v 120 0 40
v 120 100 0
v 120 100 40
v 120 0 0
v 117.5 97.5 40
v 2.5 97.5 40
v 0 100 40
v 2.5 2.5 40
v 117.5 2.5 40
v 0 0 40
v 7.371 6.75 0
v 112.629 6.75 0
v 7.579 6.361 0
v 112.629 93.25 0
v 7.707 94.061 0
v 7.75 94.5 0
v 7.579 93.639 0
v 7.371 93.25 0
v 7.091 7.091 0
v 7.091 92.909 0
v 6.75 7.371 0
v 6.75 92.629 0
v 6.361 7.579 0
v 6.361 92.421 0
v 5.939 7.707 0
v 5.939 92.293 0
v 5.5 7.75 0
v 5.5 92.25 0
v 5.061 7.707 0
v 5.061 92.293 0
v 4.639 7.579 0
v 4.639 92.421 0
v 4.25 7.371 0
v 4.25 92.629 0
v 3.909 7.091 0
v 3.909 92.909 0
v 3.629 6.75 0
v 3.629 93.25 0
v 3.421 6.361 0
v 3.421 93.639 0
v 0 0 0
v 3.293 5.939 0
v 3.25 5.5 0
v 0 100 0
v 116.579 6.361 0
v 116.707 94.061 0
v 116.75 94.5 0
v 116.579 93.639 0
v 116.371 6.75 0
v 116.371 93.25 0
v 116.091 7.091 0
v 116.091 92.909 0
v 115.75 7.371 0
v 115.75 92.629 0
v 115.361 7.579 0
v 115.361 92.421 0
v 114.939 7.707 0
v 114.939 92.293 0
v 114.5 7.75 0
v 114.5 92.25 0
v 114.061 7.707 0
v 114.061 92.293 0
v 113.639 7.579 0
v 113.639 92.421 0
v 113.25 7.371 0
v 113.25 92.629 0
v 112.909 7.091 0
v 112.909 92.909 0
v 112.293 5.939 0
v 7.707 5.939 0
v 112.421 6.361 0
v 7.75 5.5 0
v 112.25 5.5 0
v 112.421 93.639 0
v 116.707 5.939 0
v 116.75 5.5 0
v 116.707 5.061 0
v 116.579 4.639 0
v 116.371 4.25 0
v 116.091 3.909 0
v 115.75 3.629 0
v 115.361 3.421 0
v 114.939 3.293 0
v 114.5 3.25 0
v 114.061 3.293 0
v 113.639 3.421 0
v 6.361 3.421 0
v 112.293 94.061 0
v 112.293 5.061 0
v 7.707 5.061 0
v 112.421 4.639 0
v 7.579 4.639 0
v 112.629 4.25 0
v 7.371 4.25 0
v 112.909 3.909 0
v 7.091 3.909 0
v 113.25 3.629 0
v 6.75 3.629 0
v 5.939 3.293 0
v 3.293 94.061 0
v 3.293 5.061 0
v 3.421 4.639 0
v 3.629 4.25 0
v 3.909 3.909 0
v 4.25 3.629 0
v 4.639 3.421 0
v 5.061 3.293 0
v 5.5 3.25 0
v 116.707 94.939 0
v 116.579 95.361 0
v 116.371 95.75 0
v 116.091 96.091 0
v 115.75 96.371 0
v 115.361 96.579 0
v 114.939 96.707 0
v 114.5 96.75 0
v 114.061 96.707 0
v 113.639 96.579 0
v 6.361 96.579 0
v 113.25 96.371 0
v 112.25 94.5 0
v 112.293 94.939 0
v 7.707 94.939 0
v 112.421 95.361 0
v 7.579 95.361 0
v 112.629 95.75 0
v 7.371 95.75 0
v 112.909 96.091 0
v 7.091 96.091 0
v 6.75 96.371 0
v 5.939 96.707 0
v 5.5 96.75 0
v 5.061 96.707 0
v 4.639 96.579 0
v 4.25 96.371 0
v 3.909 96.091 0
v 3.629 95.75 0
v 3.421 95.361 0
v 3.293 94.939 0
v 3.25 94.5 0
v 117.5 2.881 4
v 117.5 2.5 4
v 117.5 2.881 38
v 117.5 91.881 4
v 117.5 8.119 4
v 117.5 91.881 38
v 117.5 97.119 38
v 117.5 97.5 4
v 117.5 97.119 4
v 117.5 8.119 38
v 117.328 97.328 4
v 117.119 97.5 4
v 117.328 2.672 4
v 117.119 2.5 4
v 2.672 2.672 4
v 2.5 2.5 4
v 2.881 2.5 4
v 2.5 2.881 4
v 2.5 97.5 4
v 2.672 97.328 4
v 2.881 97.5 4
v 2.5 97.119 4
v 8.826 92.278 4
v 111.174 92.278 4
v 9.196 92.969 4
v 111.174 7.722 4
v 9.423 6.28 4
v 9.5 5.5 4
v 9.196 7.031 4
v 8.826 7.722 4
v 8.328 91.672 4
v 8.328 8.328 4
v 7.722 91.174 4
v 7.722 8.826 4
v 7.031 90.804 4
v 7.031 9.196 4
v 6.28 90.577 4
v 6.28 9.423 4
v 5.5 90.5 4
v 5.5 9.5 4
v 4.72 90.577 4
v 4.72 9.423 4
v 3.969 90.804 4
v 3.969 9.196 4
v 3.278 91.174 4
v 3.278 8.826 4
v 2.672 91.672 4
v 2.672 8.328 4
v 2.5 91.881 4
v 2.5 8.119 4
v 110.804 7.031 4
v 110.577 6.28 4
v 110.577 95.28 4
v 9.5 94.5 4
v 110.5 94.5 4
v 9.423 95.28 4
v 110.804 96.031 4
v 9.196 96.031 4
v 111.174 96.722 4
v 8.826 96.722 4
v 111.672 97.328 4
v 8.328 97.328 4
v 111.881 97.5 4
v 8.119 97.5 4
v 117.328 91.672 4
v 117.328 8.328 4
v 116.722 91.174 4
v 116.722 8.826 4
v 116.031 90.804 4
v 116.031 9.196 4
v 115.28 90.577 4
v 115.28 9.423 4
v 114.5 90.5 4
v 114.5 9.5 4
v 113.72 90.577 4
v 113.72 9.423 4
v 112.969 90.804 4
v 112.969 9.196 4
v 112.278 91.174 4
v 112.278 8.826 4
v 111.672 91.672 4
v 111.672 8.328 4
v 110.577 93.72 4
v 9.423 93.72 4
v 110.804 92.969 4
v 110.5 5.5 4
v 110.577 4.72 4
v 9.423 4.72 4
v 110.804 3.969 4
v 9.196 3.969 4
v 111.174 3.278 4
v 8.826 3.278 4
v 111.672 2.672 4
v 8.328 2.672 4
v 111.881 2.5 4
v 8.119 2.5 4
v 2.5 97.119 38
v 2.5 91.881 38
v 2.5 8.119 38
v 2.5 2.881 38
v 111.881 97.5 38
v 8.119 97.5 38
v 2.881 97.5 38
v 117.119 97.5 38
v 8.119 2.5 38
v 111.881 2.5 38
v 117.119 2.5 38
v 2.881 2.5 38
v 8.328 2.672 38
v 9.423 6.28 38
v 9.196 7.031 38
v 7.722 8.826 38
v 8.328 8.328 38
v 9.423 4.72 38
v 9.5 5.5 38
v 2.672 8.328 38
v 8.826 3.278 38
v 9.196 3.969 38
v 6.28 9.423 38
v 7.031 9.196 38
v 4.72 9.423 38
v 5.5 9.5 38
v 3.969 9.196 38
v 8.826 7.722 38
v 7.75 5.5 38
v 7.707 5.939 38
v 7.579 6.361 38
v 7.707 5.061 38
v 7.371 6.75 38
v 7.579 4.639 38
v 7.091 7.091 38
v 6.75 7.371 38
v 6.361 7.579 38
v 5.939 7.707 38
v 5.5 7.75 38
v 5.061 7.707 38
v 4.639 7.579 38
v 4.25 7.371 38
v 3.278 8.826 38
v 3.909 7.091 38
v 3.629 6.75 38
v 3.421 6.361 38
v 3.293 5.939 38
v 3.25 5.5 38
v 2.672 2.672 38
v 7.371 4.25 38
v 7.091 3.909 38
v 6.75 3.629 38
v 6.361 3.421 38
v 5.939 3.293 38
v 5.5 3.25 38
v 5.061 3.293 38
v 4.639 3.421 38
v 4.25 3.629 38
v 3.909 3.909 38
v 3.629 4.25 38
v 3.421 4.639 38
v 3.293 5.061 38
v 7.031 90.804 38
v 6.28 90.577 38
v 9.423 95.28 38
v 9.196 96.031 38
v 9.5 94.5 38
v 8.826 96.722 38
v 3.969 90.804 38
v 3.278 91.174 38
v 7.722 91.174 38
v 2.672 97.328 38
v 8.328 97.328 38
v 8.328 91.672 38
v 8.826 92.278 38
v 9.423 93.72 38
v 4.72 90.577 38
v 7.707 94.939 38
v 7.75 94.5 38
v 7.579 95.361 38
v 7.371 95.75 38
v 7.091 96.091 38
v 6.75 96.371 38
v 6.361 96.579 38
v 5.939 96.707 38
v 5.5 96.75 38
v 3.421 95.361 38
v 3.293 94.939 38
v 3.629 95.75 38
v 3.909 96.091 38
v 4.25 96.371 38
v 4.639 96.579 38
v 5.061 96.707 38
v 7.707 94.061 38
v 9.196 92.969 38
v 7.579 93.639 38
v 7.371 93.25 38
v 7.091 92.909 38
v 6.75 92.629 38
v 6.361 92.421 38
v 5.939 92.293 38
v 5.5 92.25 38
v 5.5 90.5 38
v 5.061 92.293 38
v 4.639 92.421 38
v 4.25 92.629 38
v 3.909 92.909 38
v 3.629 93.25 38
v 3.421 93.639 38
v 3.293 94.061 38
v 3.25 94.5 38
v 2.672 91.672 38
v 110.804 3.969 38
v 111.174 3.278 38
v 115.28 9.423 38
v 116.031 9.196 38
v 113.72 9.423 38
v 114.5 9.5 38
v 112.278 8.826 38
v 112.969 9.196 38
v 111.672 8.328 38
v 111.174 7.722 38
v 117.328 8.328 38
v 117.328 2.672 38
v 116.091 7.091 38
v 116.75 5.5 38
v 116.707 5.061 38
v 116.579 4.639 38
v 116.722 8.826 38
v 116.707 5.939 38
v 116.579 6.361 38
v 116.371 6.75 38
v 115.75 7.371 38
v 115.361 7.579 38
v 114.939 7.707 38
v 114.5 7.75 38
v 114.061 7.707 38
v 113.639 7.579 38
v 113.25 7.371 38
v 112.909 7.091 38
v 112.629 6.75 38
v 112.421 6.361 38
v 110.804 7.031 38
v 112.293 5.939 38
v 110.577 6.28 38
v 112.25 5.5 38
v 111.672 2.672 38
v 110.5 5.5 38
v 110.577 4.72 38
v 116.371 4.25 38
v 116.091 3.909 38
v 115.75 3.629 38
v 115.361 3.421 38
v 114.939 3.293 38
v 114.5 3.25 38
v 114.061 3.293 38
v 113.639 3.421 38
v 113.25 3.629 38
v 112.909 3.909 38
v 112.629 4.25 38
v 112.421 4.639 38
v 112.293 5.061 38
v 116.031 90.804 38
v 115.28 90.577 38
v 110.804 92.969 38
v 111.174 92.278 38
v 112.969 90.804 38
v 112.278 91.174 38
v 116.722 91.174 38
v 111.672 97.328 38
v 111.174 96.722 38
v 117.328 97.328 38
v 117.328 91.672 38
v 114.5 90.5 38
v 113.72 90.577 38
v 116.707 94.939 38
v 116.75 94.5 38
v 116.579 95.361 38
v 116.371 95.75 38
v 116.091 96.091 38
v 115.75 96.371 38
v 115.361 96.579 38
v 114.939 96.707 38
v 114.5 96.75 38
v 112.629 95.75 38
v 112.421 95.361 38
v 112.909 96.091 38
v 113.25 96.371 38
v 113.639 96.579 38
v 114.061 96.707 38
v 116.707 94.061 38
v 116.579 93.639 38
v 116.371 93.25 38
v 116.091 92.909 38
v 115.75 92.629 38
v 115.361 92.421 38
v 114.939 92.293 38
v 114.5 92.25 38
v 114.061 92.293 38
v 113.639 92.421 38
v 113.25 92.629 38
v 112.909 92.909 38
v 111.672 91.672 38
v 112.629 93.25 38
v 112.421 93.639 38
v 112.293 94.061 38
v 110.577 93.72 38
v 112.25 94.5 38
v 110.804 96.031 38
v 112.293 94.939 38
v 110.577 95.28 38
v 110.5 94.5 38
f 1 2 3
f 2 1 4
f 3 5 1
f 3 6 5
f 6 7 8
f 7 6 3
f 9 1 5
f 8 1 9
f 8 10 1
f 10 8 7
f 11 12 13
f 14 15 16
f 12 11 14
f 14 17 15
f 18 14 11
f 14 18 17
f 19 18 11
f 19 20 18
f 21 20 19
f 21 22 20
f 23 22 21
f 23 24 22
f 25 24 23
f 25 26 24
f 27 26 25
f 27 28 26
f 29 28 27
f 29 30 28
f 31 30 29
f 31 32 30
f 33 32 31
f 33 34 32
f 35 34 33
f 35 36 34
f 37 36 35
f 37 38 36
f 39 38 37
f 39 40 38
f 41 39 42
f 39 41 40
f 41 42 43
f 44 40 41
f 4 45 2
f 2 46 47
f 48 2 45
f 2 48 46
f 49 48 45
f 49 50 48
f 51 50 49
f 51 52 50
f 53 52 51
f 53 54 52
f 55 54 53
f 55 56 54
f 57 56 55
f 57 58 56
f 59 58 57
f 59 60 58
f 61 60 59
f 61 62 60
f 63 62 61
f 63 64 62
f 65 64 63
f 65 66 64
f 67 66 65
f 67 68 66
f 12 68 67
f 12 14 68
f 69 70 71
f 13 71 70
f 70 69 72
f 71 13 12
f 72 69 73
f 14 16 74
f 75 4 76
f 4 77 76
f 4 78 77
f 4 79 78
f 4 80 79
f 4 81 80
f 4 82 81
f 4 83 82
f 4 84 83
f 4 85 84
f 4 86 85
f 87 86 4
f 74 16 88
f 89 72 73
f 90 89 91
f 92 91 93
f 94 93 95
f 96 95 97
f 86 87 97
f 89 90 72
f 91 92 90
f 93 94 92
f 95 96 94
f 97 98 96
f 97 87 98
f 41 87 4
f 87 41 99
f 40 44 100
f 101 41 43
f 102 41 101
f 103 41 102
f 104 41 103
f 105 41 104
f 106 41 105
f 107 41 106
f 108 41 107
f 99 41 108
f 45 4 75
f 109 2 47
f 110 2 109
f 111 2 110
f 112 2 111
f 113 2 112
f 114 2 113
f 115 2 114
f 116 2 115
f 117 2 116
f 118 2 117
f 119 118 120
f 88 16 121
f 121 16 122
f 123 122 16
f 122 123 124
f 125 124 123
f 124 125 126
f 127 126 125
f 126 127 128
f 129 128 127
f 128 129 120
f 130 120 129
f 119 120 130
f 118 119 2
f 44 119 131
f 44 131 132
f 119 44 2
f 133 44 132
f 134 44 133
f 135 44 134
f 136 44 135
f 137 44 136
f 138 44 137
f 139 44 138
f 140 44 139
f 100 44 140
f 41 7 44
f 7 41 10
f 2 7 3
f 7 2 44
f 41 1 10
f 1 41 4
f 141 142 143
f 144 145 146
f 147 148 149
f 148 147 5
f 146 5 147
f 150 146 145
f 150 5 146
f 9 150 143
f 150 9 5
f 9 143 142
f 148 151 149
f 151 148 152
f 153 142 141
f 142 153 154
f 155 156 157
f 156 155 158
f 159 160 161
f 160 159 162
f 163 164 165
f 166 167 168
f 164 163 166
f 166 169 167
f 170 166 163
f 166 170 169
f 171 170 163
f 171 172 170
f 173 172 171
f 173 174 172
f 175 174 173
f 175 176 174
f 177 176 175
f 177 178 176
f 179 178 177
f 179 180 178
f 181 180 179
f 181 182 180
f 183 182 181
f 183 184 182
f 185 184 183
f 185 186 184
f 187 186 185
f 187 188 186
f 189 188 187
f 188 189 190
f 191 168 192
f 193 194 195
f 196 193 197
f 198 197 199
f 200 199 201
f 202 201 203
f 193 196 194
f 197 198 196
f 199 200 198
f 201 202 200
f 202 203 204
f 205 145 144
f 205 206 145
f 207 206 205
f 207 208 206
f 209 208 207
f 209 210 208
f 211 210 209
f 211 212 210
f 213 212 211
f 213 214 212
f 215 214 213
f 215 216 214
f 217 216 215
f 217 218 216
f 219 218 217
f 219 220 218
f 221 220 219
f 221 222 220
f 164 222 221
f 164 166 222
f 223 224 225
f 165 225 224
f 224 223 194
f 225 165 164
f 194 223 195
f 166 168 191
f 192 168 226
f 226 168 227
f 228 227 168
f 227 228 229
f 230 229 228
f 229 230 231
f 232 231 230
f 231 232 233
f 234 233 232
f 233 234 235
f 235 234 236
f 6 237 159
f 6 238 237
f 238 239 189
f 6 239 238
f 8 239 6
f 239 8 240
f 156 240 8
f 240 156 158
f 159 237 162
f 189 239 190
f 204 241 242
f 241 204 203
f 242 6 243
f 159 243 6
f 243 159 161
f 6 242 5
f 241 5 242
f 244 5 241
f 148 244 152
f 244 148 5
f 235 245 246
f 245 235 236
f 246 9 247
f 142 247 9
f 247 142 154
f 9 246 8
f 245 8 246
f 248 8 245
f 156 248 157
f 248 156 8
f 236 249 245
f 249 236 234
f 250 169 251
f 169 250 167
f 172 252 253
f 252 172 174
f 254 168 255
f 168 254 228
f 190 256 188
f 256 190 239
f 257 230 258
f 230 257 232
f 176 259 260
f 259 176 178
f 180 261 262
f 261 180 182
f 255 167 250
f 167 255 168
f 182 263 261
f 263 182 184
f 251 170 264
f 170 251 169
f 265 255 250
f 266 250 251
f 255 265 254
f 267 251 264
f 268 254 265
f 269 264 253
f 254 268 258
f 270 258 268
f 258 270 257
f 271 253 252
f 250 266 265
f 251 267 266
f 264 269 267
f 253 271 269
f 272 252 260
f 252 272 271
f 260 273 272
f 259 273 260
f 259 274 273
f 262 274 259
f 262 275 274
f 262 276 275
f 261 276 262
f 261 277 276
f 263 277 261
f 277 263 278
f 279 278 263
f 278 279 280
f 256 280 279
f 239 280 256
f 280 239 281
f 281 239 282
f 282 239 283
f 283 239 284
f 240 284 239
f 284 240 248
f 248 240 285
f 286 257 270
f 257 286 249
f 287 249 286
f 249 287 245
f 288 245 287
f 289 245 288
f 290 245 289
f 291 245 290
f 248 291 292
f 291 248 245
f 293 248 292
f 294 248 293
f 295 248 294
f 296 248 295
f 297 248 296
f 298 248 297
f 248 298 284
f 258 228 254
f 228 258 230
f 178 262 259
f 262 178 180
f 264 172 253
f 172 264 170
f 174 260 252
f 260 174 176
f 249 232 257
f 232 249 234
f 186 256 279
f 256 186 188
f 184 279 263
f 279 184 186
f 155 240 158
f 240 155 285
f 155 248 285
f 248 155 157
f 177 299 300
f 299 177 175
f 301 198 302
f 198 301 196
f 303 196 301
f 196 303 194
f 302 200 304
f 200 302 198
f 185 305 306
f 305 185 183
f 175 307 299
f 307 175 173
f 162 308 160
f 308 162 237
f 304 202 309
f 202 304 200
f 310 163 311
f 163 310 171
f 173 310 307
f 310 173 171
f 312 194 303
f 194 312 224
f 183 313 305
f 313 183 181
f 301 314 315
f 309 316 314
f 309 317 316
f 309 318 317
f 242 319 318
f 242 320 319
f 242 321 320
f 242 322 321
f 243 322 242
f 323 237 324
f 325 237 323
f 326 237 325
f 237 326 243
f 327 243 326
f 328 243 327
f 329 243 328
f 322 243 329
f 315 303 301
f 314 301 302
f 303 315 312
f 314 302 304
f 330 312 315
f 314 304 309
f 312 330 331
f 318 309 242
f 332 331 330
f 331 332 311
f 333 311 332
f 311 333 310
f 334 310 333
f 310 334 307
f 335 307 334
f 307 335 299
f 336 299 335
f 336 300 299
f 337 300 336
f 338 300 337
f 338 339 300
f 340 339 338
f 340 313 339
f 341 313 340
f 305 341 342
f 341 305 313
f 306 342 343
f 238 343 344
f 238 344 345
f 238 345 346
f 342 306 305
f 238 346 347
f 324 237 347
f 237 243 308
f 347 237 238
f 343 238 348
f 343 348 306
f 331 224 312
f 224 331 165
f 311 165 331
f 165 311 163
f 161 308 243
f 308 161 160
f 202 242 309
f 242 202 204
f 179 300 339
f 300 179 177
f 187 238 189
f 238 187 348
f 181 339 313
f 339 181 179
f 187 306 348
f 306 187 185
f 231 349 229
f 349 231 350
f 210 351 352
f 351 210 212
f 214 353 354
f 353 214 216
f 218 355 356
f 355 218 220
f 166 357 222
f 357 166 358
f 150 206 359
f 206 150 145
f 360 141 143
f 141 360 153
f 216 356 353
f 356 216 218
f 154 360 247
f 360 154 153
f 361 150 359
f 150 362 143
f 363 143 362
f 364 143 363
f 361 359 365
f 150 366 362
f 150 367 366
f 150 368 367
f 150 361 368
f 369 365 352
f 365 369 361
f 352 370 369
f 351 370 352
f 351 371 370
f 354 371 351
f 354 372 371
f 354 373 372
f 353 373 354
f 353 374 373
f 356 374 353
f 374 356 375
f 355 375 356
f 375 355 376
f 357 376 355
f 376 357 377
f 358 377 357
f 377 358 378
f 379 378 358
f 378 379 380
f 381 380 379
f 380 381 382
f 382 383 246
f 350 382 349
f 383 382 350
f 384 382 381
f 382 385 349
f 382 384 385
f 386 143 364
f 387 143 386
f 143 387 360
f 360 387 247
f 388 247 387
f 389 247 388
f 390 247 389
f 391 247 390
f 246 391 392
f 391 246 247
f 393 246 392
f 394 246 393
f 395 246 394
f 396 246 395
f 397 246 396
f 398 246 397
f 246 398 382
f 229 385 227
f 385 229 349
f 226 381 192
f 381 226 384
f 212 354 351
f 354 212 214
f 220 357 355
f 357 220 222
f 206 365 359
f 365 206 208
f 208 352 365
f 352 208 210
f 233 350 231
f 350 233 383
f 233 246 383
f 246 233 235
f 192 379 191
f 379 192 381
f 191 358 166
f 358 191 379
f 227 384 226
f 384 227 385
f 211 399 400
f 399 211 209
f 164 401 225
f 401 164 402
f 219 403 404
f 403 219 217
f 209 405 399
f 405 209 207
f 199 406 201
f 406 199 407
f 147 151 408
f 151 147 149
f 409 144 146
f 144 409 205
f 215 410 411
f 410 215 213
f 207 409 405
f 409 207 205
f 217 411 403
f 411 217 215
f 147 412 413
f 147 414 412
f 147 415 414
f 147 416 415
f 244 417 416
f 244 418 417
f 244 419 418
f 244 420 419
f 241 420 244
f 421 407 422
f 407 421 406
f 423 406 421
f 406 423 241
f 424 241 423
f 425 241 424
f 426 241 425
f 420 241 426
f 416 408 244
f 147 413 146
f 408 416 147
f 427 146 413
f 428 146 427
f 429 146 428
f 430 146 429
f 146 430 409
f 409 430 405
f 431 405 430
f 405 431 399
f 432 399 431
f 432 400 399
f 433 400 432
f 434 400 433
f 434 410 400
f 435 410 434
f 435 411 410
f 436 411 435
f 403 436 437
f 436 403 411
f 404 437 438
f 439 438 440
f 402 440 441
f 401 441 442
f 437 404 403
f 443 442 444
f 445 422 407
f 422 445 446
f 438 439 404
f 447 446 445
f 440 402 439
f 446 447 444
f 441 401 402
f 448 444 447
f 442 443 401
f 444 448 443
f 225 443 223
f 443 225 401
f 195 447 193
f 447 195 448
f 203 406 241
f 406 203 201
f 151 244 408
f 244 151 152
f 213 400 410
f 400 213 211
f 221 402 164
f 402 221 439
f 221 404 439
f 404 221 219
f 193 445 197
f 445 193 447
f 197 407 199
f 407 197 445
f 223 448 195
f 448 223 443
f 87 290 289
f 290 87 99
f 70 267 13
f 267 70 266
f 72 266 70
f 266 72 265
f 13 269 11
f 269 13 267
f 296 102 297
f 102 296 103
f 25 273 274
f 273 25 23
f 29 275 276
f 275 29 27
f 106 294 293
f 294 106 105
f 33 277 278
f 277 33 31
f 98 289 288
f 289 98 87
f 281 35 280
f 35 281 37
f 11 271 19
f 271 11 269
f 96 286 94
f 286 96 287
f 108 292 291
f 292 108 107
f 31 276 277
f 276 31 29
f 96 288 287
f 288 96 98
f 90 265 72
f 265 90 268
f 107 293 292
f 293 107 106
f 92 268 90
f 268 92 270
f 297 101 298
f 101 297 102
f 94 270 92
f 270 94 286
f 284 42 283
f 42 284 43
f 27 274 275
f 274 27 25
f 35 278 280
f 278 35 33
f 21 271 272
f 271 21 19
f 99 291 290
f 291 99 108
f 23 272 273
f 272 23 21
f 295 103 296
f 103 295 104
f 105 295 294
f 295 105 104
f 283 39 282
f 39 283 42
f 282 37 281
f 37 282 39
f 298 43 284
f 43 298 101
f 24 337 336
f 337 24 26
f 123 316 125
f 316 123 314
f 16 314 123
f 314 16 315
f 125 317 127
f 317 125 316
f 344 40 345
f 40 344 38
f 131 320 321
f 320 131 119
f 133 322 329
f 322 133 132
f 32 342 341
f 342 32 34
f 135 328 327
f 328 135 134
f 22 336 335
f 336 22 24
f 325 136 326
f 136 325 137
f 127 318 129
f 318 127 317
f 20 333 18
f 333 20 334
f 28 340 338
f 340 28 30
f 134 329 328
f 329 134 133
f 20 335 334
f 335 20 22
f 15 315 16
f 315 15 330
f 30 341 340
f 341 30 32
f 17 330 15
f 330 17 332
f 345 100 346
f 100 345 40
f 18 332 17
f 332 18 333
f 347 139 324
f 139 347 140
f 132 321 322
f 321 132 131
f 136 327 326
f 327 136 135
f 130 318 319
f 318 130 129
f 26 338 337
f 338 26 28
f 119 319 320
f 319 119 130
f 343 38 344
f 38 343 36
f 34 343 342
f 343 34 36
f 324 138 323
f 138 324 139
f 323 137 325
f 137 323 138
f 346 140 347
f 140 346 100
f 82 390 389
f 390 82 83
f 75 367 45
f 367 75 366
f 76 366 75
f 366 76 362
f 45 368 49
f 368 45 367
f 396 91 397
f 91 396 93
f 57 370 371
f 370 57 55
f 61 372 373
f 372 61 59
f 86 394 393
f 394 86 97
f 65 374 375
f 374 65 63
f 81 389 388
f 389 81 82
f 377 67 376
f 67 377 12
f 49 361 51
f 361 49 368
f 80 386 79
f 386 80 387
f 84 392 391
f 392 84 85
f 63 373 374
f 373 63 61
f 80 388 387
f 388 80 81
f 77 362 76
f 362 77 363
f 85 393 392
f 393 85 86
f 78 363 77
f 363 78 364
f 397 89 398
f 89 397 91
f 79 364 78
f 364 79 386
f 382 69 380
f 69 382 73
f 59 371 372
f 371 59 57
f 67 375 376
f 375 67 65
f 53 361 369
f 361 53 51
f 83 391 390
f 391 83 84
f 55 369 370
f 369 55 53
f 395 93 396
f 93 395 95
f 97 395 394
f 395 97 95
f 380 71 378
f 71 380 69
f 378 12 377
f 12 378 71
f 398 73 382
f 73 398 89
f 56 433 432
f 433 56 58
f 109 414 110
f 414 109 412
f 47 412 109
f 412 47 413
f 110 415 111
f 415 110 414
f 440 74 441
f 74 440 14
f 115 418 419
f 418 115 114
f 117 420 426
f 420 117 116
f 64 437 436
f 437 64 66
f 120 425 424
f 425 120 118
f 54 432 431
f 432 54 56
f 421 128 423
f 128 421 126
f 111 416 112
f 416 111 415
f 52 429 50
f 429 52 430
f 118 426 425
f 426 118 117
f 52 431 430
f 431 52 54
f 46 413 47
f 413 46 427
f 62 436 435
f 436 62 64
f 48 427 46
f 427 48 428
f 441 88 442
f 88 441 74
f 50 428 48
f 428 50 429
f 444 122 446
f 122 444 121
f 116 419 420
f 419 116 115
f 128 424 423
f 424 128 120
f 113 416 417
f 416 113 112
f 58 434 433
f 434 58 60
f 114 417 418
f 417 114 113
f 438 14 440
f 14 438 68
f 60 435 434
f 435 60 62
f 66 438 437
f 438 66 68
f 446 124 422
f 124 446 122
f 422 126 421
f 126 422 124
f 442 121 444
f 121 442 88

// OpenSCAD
$fn = 32;

// ----------------------------------------------------------------------
// Enclosure body: 120 x 100 x 40 mm, wall 2.5 mm
// ----------------------------------------------------------------------

// --- parameters (mm) ---
length = 120;             // outside length, X
width = 100;              // outside width, Y
height = 40;              // outside height, Z
wall = 2.5;               // side wall thickness
floor_t = 4;              // floor thickness
boss_d = 8;               // corner boss diameter
boss_h = 34;              // corner boss height above the floor
boss_hole_d = 4.5;        // lid screw clearance in the boss
boss_lip = 5.5;           // boss centre inset from the corner

module shell() {
  difference() {
    cube([length, width, height]);
    /* hollow, open at the top */
    translate([wall, wall, floor_t])
      cube([length - 2 * wall, width - 2 * wall, height]);
  }
}

module bosses() {
  /* corner bosses, sunk 1 mm into the floor */
  for (sx = [0, 1]) for (sy = [0, 1])
    translate([sx * (length - 2 * boss_lip) + boss_lip, sy * (width - 2 * boss_lip) + boss_lip, floor_t - 1])
      cylinder(h = boss_h + 1, d = boss_d);
}

difference() {
  union() {
    shell();
    bosses();
  }
  /* boss screw holes */
  for (sx = [0, 1]) for (sy = [0, 1])
    translate([sx * (length - 2 * boss_lip) + boss_lip, sy * (width - 2 * boss_lip) + boss_lip, -1]) cylinder(h = floor_t + boss_h + 2, d = boss_hole_d);
}
